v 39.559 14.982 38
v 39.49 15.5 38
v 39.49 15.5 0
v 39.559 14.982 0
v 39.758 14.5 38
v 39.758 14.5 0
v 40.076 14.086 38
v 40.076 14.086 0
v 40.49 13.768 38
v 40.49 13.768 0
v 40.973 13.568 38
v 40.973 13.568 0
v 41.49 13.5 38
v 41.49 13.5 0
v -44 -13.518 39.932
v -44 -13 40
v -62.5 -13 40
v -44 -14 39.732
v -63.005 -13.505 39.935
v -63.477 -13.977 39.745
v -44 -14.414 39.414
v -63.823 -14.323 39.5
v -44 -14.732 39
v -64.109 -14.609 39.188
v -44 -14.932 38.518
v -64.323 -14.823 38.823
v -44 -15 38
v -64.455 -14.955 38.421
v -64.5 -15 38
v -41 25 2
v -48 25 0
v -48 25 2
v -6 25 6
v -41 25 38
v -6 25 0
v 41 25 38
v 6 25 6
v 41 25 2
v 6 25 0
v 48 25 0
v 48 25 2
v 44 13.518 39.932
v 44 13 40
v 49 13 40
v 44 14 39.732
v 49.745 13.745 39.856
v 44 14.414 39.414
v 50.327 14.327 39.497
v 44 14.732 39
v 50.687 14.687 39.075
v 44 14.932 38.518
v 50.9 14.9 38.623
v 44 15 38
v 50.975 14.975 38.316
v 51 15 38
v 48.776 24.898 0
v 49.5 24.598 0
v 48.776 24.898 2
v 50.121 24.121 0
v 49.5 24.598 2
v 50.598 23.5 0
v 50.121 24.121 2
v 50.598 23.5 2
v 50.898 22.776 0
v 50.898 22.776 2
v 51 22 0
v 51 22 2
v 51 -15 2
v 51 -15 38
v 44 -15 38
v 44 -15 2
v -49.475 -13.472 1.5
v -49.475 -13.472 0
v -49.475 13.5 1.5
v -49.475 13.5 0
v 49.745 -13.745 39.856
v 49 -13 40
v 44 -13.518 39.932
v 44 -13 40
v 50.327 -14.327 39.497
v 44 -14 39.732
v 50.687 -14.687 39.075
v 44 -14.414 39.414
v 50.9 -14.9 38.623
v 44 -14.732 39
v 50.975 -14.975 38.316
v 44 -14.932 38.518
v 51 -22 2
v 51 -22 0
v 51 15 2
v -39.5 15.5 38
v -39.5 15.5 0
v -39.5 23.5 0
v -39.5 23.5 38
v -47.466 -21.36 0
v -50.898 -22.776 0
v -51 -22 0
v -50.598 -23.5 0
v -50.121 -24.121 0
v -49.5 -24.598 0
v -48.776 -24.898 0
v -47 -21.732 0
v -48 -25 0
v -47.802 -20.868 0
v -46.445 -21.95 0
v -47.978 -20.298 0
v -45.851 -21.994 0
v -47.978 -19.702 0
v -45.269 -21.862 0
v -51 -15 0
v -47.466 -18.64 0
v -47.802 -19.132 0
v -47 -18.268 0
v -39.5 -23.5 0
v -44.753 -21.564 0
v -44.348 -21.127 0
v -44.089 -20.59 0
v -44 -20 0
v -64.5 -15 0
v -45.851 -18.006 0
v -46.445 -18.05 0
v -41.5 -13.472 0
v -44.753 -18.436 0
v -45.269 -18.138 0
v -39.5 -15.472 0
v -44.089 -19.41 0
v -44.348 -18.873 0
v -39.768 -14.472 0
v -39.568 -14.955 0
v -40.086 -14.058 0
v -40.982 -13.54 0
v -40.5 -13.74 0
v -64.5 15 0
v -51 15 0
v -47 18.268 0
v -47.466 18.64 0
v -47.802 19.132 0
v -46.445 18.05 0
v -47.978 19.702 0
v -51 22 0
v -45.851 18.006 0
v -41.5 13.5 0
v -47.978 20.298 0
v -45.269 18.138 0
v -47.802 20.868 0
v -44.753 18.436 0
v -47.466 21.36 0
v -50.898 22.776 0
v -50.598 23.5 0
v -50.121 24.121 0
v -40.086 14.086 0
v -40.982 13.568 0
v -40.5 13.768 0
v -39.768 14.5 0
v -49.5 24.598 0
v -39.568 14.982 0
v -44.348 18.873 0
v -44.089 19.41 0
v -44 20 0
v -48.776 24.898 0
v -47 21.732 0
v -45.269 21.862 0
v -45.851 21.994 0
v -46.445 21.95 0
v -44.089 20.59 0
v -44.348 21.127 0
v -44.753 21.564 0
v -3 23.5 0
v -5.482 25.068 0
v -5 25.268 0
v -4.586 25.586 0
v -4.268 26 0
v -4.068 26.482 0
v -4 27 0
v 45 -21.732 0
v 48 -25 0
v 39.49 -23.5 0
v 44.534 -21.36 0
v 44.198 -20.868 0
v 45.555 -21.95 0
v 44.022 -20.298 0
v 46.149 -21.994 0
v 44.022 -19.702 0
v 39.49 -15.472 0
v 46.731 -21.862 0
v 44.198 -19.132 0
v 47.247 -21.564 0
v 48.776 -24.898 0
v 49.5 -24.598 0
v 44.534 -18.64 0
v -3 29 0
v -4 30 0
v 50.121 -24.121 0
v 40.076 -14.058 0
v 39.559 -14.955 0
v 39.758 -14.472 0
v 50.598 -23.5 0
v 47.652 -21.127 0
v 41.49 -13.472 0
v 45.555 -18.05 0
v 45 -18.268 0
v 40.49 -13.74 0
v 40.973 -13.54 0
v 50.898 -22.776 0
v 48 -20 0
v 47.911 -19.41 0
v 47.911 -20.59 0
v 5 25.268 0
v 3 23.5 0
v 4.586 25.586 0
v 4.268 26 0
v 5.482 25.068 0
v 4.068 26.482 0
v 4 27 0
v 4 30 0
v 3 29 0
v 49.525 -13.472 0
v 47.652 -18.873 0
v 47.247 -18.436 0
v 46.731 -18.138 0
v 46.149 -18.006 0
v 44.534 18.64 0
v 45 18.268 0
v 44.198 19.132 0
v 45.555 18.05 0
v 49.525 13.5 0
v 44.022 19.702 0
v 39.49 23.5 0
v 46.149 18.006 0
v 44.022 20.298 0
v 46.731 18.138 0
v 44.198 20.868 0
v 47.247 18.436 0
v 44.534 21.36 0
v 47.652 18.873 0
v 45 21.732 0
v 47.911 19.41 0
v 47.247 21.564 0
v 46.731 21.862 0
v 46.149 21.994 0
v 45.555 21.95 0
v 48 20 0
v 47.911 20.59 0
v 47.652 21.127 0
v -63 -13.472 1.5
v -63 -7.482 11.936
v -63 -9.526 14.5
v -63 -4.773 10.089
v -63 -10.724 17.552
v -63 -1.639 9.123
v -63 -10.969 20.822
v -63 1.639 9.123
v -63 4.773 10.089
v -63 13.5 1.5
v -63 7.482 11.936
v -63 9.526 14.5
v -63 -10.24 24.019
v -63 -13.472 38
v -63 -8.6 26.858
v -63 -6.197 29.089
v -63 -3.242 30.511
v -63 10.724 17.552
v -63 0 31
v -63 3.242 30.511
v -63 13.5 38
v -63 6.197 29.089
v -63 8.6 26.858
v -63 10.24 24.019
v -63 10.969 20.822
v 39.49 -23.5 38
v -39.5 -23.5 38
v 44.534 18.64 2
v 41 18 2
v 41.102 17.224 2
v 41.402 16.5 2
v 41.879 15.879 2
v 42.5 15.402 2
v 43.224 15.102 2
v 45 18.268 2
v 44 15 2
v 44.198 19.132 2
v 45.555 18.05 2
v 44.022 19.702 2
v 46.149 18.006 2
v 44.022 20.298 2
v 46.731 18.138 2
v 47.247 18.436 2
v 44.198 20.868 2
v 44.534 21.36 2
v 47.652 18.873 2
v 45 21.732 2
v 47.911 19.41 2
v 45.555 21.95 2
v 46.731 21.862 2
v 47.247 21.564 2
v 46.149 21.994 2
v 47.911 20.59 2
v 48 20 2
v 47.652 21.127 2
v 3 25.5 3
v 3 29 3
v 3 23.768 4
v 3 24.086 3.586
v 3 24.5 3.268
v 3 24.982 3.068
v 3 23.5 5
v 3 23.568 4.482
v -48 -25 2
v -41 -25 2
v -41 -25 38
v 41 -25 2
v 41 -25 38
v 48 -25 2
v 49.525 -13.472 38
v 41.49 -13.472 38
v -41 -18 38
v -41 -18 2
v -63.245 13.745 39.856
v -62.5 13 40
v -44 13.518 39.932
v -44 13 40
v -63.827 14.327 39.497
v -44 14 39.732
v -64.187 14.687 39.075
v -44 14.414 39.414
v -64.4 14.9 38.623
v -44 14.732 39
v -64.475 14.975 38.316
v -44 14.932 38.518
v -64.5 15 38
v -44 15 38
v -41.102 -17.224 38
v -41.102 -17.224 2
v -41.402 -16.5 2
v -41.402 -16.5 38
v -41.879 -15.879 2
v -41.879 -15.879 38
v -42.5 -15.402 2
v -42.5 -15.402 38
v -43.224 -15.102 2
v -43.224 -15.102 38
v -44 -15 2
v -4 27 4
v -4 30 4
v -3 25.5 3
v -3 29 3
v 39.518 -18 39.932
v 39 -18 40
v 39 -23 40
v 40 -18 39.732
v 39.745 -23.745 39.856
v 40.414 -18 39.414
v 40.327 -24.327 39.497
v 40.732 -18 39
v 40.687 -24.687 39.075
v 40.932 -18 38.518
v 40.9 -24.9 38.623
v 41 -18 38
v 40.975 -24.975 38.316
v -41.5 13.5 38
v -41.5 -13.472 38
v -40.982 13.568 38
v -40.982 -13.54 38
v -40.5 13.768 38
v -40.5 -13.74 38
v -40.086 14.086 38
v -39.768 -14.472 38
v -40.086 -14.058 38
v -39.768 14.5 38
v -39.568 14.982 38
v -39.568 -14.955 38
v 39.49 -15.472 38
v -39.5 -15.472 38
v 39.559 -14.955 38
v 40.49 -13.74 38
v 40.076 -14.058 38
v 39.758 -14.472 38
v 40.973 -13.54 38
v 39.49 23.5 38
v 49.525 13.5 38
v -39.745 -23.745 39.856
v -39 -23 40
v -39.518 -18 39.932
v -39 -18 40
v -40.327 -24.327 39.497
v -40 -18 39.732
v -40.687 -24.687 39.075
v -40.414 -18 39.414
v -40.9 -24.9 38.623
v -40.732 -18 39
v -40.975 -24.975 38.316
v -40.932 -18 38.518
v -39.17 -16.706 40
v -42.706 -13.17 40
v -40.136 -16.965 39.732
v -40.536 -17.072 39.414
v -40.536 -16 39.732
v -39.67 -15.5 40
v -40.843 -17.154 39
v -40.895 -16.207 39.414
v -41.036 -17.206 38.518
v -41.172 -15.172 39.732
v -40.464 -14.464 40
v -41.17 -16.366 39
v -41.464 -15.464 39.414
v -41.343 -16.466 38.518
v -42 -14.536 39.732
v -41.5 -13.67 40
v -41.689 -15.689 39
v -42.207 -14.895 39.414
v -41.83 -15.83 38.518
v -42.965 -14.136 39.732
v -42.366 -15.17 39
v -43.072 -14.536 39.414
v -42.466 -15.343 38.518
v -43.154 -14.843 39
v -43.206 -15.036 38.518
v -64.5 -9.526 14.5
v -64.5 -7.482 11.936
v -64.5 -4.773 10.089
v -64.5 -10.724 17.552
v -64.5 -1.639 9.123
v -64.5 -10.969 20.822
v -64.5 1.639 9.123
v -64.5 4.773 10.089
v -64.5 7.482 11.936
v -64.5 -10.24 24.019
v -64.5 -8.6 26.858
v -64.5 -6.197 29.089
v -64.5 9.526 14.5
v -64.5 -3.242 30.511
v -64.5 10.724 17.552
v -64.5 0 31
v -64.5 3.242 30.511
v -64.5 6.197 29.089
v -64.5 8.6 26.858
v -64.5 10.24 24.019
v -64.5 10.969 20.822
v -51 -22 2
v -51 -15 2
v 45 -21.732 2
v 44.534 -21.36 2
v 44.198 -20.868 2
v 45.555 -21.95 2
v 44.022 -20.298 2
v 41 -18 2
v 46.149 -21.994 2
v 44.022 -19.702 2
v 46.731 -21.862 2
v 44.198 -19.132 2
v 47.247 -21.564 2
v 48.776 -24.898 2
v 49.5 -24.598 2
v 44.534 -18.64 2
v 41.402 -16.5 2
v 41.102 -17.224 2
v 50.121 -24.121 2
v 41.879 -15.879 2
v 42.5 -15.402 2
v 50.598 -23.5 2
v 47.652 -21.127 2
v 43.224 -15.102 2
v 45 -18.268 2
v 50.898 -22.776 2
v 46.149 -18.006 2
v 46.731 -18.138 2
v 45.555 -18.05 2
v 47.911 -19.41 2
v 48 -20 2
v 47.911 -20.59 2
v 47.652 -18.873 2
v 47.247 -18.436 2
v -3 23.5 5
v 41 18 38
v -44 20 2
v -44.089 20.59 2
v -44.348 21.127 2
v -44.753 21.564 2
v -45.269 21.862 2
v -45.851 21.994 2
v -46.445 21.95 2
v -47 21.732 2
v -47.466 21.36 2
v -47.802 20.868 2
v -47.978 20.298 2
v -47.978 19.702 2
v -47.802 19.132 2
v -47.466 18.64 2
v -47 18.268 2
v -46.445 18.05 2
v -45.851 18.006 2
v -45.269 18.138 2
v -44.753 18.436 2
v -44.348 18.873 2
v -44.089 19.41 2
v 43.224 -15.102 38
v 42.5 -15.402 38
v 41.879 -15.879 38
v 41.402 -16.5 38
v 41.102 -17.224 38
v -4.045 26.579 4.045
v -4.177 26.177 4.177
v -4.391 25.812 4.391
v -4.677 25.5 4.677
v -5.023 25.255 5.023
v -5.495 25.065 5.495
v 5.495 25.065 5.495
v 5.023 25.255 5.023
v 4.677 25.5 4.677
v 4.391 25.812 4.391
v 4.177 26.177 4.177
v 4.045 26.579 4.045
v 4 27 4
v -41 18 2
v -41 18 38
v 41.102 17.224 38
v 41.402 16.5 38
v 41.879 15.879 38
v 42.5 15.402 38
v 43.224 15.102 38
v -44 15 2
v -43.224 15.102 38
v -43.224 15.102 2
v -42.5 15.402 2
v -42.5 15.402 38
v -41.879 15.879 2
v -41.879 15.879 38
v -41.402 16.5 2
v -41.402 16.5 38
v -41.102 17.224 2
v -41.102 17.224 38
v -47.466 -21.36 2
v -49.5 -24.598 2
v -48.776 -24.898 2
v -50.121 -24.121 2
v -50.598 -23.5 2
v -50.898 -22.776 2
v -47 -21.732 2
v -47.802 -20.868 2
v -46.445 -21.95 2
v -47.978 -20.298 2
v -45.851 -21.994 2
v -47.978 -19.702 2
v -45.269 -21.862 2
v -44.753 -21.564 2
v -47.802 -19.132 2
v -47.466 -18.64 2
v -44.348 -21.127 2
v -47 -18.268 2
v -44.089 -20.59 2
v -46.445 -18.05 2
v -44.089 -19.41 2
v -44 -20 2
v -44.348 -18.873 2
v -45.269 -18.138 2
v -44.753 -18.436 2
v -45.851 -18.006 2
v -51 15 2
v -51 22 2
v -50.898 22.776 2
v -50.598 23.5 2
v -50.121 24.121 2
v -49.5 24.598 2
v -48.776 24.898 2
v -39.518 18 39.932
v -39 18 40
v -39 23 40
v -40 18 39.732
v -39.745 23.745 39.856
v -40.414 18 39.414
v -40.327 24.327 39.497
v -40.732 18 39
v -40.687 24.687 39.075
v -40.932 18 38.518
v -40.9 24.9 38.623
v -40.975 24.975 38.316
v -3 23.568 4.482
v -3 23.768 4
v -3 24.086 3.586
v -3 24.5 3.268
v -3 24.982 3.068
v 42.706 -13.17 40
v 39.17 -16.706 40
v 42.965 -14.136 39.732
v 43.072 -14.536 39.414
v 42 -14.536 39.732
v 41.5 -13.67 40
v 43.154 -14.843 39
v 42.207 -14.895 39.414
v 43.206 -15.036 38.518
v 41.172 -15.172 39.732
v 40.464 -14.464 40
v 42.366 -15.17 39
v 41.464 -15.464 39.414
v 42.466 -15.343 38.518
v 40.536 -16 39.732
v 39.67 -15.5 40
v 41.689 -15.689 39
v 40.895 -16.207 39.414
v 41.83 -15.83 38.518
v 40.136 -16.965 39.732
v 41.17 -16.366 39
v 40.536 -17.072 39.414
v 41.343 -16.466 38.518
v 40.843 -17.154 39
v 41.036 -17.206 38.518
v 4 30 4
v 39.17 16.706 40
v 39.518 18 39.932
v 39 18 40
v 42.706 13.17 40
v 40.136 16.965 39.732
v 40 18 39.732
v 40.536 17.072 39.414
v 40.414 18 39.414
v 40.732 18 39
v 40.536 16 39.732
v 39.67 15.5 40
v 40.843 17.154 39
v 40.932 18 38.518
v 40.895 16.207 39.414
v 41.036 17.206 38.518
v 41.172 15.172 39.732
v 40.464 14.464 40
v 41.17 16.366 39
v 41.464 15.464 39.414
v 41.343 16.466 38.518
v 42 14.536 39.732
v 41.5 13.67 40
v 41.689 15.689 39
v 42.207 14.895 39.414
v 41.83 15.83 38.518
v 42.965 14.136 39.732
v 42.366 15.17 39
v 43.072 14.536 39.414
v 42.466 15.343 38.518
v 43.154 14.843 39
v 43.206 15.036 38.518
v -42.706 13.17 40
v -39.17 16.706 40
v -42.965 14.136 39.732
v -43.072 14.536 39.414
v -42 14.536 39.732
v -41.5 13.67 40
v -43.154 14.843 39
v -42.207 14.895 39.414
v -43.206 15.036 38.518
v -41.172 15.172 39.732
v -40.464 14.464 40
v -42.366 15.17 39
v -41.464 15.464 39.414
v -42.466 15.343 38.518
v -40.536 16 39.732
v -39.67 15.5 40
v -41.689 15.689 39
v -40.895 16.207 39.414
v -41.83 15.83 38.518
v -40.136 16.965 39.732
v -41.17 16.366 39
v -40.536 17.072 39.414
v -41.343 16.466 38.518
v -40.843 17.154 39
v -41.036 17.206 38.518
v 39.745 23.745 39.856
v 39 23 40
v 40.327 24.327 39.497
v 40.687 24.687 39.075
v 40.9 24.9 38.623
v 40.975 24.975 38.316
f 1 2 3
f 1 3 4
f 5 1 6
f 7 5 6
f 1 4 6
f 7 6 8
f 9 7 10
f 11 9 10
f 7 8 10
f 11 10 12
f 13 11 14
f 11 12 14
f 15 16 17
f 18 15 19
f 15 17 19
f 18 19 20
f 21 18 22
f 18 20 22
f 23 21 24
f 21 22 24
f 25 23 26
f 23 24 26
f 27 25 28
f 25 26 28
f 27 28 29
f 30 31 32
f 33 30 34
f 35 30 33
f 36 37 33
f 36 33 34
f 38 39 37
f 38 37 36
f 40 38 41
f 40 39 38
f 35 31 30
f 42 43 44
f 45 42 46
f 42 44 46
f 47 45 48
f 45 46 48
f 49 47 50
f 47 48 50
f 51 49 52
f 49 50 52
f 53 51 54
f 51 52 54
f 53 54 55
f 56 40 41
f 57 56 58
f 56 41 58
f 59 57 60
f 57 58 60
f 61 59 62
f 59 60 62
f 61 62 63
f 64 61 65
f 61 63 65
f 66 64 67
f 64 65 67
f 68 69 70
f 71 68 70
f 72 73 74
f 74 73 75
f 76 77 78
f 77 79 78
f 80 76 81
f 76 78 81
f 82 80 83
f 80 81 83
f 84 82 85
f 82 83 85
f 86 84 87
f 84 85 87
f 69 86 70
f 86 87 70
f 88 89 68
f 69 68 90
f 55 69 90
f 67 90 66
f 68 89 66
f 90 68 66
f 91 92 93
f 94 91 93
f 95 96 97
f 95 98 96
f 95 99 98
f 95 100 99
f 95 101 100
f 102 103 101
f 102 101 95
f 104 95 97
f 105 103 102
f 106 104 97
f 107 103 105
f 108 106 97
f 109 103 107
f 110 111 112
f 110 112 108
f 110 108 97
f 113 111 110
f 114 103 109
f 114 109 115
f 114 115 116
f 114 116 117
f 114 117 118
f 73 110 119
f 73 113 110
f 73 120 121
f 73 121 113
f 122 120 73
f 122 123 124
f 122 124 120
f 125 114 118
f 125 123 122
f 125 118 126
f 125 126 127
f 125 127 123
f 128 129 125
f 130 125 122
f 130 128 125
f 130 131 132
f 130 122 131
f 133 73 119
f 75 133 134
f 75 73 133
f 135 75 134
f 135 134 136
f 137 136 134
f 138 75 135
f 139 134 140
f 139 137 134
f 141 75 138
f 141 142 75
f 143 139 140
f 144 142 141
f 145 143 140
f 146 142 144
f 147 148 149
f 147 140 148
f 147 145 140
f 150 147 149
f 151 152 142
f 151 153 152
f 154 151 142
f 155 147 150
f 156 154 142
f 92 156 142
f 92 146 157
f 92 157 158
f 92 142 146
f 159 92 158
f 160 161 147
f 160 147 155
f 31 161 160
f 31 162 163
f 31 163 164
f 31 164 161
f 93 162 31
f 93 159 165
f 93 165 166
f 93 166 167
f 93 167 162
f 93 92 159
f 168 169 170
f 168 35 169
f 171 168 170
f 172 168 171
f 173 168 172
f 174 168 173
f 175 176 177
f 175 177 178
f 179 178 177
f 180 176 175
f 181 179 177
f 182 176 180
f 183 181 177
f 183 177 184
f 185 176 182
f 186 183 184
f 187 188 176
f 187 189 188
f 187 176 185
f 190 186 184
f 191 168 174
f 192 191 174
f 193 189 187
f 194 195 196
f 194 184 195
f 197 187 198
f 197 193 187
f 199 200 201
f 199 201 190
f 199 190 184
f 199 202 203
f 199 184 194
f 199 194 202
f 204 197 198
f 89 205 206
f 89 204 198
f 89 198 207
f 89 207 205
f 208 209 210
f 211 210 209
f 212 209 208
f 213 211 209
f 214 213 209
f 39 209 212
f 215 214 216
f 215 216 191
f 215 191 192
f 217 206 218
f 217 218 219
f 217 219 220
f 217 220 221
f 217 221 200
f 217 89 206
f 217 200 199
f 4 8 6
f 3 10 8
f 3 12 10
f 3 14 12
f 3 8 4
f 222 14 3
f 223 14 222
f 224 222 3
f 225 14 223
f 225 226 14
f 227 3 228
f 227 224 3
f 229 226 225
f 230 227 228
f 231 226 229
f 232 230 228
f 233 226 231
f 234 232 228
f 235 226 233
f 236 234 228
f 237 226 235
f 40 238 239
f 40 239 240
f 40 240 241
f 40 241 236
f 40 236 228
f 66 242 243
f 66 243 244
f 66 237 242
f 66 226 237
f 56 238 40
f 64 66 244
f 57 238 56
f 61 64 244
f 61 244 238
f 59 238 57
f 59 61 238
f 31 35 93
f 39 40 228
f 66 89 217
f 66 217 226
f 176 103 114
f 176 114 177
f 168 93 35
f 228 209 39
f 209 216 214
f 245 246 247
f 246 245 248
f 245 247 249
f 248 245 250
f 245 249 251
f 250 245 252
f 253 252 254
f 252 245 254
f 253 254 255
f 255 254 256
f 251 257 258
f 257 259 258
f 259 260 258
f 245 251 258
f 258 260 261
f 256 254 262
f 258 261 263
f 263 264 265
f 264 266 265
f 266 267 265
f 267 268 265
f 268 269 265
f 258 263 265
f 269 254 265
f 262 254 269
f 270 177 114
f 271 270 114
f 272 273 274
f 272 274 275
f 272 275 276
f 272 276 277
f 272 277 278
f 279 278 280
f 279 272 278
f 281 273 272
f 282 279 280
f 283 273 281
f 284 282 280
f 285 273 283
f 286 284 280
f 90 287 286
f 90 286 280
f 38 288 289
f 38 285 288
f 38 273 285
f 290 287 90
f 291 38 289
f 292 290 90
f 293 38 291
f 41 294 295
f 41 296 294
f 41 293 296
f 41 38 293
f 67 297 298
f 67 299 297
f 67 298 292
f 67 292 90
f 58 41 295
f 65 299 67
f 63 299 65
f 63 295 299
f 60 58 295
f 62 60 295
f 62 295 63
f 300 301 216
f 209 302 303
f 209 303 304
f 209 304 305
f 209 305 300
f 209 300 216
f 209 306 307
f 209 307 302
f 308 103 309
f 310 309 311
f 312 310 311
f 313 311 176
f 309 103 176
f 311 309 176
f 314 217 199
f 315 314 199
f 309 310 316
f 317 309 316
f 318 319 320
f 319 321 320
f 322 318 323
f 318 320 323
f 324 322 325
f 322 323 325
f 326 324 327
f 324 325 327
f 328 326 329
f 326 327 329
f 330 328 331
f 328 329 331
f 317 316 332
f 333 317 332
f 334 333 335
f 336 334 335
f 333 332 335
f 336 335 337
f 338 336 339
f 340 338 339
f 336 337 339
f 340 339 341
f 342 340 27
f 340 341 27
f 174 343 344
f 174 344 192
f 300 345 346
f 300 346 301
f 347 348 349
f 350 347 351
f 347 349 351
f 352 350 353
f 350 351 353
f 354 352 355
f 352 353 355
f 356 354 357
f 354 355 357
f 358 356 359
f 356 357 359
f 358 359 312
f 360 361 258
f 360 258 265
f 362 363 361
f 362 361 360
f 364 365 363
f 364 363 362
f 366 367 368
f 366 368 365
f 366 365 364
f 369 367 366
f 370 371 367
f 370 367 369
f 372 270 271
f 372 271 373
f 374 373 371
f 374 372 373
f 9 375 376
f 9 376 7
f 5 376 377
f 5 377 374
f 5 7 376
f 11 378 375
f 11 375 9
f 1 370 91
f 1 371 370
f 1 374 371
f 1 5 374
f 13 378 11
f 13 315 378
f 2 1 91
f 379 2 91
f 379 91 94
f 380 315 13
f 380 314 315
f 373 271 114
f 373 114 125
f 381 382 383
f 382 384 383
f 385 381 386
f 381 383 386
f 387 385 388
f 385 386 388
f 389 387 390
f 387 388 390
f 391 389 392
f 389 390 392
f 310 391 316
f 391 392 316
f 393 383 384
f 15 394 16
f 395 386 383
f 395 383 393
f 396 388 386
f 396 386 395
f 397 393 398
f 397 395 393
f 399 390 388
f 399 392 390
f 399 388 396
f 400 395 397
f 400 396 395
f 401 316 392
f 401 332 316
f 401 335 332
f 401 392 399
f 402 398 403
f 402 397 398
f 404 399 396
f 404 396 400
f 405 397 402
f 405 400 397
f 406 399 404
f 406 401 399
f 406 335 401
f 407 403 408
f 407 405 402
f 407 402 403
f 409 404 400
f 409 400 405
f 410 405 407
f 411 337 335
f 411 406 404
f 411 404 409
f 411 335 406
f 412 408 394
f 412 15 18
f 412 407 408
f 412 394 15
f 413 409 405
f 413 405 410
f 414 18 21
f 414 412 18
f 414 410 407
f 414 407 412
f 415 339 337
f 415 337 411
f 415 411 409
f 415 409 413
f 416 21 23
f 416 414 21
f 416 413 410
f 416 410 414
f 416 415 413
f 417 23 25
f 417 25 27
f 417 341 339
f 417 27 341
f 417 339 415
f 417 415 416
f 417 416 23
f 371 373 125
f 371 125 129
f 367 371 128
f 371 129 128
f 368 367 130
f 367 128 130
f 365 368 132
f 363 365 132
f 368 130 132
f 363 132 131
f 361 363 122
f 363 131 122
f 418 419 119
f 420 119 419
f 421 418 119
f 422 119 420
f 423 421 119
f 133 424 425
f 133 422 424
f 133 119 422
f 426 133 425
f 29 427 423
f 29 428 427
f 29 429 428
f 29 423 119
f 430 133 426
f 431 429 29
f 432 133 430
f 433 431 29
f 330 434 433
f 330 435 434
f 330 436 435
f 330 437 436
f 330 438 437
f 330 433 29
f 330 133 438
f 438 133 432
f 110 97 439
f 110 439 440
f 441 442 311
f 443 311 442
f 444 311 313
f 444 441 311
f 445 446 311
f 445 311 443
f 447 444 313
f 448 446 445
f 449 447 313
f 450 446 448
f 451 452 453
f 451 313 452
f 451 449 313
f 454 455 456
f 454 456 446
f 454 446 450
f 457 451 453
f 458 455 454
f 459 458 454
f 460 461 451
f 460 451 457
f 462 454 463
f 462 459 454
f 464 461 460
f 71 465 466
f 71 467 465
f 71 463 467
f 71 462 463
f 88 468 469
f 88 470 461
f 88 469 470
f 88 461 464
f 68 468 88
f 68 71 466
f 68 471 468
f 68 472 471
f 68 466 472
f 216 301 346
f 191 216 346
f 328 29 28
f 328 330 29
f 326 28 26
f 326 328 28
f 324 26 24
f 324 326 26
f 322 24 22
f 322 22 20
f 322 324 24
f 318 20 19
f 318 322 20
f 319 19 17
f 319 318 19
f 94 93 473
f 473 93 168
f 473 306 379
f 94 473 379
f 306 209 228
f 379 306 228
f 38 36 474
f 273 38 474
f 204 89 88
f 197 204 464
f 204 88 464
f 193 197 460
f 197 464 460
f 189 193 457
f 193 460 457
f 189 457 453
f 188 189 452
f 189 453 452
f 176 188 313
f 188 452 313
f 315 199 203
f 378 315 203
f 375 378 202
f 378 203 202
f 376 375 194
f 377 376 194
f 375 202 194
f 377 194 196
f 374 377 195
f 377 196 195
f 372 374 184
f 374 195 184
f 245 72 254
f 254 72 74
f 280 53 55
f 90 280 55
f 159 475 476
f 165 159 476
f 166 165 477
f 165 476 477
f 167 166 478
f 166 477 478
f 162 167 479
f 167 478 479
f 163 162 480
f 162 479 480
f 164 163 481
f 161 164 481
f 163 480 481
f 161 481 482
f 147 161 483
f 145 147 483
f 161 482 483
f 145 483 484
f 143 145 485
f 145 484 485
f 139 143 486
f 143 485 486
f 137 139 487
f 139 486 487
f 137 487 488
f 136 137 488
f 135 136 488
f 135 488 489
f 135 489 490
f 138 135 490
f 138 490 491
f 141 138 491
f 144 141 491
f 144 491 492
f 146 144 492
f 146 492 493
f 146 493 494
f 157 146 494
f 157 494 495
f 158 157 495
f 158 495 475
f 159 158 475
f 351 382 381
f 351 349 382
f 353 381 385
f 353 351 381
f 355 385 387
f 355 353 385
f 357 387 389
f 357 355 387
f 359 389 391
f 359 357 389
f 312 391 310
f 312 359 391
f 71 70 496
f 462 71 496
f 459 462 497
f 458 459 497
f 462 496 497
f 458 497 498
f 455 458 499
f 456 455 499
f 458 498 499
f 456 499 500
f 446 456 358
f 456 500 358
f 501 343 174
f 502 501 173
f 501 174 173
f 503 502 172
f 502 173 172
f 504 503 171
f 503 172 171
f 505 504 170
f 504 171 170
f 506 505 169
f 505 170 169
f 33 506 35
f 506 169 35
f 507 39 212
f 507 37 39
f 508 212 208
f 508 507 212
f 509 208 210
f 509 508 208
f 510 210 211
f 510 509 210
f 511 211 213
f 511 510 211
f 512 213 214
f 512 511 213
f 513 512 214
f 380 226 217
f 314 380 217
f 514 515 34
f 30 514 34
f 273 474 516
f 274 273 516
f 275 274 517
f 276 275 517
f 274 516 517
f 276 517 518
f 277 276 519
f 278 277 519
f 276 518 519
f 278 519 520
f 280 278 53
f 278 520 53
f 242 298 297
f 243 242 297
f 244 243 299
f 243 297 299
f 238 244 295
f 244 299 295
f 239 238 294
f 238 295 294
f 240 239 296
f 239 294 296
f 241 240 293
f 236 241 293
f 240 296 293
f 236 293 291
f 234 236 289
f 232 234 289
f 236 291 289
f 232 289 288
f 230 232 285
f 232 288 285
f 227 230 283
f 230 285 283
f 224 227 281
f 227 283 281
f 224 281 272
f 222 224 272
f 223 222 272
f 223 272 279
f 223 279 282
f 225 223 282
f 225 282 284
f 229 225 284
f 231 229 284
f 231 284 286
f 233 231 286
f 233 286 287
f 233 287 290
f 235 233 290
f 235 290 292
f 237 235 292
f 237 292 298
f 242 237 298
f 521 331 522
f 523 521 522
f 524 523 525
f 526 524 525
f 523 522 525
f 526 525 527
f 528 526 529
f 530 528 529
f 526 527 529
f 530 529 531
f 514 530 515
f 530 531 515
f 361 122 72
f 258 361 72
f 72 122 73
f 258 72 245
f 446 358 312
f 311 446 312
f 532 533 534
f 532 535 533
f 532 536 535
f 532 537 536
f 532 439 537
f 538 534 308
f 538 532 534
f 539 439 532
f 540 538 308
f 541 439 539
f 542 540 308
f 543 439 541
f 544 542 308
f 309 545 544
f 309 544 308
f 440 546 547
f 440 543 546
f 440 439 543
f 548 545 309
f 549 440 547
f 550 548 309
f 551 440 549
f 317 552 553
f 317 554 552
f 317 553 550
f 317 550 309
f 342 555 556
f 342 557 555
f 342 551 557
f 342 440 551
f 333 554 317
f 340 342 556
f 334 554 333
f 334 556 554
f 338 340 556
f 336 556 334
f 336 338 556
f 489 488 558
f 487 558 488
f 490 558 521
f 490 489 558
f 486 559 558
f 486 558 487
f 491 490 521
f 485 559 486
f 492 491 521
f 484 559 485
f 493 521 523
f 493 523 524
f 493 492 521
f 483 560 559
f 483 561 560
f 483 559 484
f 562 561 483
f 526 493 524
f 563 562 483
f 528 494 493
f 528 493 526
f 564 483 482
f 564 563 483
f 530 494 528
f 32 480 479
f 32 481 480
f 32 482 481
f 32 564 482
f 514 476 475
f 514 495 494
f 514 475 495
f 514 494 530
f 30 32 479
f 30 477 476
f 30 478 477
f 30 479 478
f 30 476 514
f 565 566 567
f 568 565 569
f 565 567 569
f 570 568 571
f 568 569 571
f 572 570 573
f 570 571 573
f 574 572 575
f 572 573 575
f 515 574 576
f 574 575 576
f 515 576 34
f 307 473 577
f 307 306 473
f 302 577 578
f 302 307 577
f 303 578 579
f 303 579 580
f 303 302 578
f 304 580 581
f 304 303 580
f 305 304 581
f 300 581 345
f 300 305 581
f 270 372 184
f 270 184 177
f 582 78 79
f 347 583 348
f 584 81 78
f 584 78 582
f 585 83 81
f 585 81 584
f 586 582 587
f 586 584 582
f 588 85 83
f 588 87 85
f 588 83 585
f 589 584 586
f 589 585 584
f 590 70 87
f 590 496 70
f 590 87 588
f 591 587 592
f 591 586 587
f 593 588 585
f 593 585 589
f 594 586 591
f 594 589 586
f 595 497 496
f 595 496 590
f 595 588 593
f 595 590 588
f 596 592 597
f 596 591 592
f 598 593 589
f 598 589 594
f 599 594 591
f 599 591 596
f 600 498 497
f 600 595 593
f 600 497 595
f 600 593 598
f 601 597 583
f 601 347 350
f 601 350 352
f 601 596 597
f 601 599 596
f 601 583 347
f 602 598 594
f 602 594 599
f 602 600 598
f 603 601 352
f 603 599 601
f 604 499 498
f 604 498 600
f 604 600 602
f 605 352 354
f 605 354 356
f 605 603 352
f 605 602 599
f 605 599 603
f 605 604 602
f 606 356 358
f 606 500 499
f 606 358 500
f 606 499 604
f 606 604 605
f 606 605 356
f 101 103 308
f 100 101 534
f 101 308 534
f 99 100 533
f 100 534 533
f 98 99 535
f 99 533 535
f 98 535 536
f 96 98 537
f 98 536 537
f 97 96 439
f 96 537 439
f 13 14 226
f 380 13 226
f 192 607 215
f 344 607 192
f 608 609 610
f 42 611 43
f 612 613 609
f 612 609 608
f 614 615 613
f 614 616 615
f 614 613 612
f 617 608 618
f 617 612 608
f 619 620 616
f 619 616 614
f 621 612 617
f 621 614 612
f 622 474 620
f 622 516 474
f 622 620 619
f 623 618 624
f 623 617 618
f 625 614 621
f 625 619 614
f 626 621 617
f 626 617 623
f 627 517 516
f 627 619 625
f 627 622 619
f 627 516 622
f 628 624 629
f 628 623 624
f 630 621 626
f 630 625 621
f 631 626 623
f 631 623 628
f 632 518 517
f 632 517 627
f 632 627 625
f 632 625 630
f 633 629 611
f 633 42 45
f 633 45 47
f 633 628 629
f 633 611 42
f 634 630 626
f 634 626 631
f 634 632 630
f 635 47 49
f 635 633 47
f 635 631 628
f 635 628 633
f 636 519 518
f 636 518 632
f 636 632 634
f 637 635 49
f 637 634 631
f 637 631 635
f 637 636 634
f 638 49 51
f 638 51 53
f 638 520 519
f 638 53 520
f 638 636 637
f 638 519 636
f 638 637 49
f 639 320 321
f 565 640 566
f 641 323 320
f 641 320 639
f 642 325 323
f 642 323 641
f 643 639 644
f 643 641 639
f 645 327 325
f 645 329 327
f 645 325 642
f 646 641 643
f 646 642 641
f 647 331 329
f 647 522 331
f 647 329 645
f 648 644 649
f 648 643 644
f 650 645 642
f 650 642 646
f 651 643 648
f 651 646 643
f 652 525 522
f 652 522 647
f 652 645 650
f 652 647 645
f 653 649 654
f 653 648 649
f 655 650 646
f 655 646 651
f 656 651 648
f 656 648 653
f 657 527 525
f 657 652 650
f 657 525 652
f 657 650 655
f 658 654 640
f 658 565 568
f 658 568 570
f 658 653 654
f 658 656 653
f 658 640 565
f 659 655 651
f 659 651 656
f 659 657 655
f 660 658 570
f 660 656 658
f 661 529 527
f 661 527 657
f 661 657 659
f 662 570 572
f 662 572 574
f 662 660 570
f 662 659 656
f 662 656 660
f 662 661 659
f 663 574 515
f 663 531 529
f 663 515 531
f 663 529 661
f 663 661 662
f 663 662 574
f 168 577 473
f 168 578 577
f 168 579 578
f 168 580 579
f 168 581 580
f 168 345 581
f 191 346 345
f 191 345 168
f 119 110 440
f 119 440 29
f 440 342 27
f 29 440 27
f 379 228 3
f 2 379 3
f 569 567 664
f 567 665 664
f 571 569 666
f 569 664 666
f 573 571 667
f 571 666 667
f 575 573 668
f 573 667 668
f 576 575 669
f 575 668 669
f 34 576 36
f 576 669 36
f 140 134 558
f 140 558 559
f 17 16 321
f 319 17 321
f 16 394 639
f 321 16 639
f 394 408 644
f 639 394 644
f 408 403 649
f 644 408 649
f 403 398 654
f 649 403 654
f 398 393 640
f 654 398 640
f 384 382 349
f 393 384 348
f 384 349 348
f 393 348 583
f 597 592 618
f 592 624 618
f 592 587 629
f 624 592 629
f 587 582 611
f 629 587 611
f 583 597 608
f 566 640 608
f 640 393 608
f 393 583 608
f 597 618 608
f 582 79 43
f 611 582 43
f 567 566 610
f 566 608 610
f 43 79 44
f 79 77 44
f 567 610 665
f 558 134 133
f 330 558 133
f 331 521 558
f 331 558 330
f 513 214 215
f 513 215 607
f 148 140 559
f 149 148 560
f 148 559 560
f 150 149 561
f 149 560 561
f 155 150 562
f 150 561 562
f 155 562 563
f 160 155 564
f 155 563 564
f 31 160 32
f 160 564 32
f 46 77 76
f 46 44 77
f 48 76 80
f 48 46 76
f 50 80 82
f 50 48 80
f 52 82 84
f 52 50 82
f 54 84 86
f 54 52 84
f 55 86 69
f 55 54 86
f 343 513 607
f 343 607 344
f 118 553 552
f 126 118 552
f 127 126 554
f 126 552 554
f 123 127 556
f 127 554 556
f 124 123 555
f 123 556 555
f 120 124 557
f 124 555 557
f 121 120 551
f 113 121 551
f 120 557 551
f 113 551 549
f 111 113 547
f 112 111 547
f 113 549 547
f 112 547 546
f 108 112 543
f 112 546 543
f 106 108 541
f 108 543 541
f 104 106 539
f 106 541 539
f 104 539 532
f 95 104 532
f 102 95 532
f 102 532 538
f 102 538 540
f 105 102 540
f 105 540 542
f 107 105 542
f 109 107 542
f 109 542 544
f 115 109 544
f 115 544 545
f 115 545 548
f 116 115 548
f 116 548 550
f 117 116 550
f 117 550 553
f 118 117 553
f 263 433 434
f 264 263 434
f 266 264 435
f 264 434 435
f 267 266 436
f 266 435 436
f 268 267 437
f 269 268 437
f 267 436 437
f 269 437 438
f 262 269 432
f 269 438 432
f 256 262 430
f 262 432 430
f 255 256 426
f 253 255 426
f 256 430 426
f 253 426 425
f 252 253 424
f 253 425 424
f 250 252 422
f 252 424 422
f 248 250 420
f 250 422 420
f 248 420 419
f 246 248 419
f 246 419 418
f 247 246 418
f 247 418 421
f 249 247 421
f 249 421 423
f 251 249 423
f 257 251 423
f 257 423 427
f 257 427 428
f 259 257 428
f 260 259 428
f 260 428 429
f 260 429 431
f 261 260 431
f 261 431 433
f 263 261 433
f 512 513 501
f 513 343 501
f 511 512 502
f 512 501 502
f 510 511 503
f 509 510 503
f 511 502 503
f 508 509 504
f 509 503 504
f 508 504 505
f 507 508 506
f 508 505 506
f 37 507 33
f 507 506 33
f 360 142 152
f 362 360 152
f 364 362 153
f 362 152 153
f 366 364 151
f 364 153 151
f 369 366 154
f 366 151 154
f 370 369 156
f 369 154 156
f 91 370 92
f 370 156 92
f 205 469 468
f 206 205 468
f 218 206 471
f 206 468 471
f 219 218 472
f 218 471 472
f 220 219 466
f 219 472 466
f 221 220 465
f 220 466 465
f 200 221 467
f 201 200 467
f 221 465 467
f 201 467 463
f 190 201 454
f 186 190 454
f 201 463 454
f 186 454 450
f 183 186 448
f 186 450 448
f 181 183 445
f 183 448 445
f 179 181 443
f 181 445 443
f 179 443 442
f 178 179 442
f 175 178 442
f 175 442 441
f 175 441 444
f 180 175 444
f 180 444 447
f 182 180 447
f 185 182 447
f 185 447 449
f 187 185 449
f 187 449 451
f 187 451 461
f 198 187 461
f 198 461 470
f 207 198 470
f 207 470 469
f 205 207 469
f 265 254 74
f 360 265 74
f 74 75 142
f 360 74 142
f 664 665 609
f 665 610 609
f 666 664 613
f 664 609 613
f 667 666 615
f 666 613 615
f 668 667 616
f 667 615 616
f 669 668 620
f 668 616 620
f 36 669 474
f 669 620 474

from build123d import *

# Parameters (mm, degrees)
CROQUIS1_W              = 102
CROQUIS1_H              = 50
SALIENTE_EXTRUIR1_DEPTH = 40
CORTAR_EXTRUIR1_DEPTH   = 38
CROQUIS4_R              = 2
CORTAR_EXTRUIR2_DEPTH   = 18
CORTAR_EXTRUIR3_DEPTH   = 38
CROQUIS7_W              = 6
CROQUIS7_H              = 3
CORTAR_EXTRUIR5_DEPTH   = 10
SALIENTE_EXTRUIR2_DEPTH = 5
CROQUIS9_W              = 6
CROQUIS9_H              = 1
SALIENTE_EXTRUIR3_DEPTH = 3
REDONDEO2_R             = 2
REDONDEO4_R             = 2
CROQUIS16_W             = 36.5
CROQUIS16_H             = 26.972151698
CORTAR_EXTRUIR13_DEPTH  = 5.5
CROQUIS17_W             = 40
CROQUIS17_H             = 30
CROQUIS17_W_2           = 36.5
CROQUIS17_H_2           = 26.972151698
SALIENTE_EXTRUIR7_DEPTH = 13.5
CROQUIS18_W             = 1.5
CROQUIS18_H             = 36.5
SALIENTE_EXTRUIR8_DEPTH = 27.5
CROQUIS19_R             = 11
CORTAR_EXTRUIR14_DEPTH  = 27.5
REDONDEO5_R             = 2


with BuildPart() as part:
    # Croquis1 → Saliente-Extruir1 (new body)
    with BuildSketch(Plane.XY):
        Rectangle(CROQUIS1_W, CROQUIS1_H)
    extrude(amount=SALIENTE_EXTRUIR1_DEPTH)

    # Croquis3 → Cortar-Extruir1 (cut)
    with BuildSketch(Plane.XY.offset(40)):
        with BuildLine():
            Line((51, 25), (41, 25))
            Line((41, 25), (41, 18))
            ThreePointArc((41, 18), (41.878679656, 15.878679656), (44, 15))
            Line((44, 15), (51, 15))
            Line((51, 15), (51, 25))
        make_face()
        with BuildLine():
            Line((41, -18), (41, -25))
            Line((41, -25), (51, -25))
            Line((51, -25), (51, -15))
            Line((51, -15), (44, -15))
            ThreePointArc((44, -15), (41.878679656, -15.878679656), (41, -18))
        make_face()
        with BuildLine():
            Line((-44, -15), (-51, -15))
            Line((-51, -15), (-51, -25))
            Line((-51, -25), (-41, -25))
            Line((-41, -25), (-41, -18))
            ThreePointArc((-41, -18), (-41.878679656, -15.878679656), (-44, -15))
        make_face()
        with BuildLine():
            Line((-51, 25), (-51, 15))
            Line((-51, 15), (-44, 15))
            ThreePointArc((-44, 15), (-41.878679656, 15.878679656), (-41, 18))
            Line((-41, 18), (-41, 25))
            Line((-41, 25), (-51, 25))
        make_face()
    extrude(amount=-CORTAR_EXTRUIR1_DEPTH, mode=Mode.SUBTRACT)

    # Croquis4 → Cortar-Extruir2 (cut)
    with BuildSketch(Plane.XY.offset(2)):
        with BuildLine():
            Line((-51, -25), (-48, -25))
            ThreePointArc((-48, -25), (-50.121320344, -24.121320344), (-51, -22))
            Line((-51, -22), (-51, -25))
        make_face()
        with Locations((-46, -20)):
            Circle(CROQUIS4_R)
        with BuildLine():
            Line((-51, 25), (-51, 22))
            ThreePointArc((-51, 22), (-50.121320344, 24.121320344), (-48, 25))
            Line((-48, 25), (-51, 25))
        make_face()
        with Locations((-46, 20)):
            Circle(CROQUIS4_R)
        with Locations((46, 20)):
            Circle(CROQUIS4_R)
        with BuildLine():
            ThreePointArc((48, 25), (50.121320344, 24.121320344), (51, 22))
            Line((51, 22), (51, 25))
            Line((51, 25), (48, 25))
        make_face()
        with Locations((46, -20)):
            Circle(CROQUIS4_R)
        with BuildLine():
            ThreePointArc((51, -22), (50.121320344, -24.121320344), (48, -25))
            Line((48, -25), (51, -25))
            Line((51, -25), (51, -22))
        make_face()
    extrude(amount=-CORTAR_EXTRUIR2_DEPTH, mode=Mode.SUBTRACT)

    # Croquis5 → Cortar-Extruir3 (cut)
    with BuildSketch(Plane(origin=(0, 0, 0), x_dir=(-1, 0, 0), z_dir=(0, 0, -1))):
        with BuildLine():
            Line((0, 23.5), (-39.490487895, 23.5))
            Line((-39.490487895, 23.5), (-39.490487895, 15.5))
            ThreePointArc((-39.490487895, 15.5), (-40.076274332, 14.085786438), (-41.490487895, 13.5))
            Line((-41.490487895, 13.5), (-49.525351845, 13.5))
            Line((-49.525351845, 13.5), (-49.525351845, -13.472151698))
            Line((-49.525351845, -13.472151698), (-41.490487895, -13.472151698))
            ThreePointArc((-41.490487895, -13.472151698), (-40.076274332, -14.057938136), (-39.490487895, -15.472151698))
            Line((-39.490487895, -15.472151698), (-39.490487895, -23.5))
            Line((-39.490487895, -23.5), (39.5, -23.5))
            Line((39.5, -23.5), (39.5, -15.472151698))
            ThreePointArc((39.5, -15.472151698), (40.085786438, -14.057938136), (41.5, -13.472151698))
            Line((41.5, -13.472151698), (49.474648155, -13.472151698))
            Line((49.474648155, -13.472151698), (49.474648155, 13.5))
            Line((49.474648155, 13.5), (41.5, 13.5))
            ThreePointArc((41.5, 13.5), (40.085786438, 14.085786438), (39.5, 15.5))
            Line((39.5, 15.5), (39.5, 23.5))
            Line((39.5, 23.5), (0, 23.5))
        make_face()
    extrude(amount=-CORTAR_EXTRUIR3_DEPTH, mode=Mode.SUBTRACT)

    # Croquis7 → Cortar-Extruir5 (cut)
    with BuildSketch(Plane(origin=(0, 25, 0), x_dir=(1, 0, 0), z_dir=(0, 1, 0))):
        with Locations((0, -1.5)):
            Rectangle(CROQUIS7_W, CROQUIS7_H)
    extrude(amount=-CORTAR_EXTRUIR5_DEPTH, mode=Mode.SUBTRACT)

    # Croquis8 → Saliente-Extruir2 (add)
    with BuildSketch(Plane(origin=(0, 25, 0), x_dir=(1, 0, 0), z_dir=(0, 1, 0))):
        Polygon((3, 0), (4, 0), (4, -4), (-4, -4), (-4, 0), (-3, 0), (-3, -3), (3, -3), align=None)
    extrude(amount=SALIENTE_EXTRUIR2_DEPTH)

    # Croquis9 → Saliente-Extruir3 (add)
    with BuildSketch(Plane(origin=(0, 0, 3), x_dir=(-1, 0, 0), z_dir=(0, 0, -1))):
        with Locations((0, 29.5)):
            Rectangle(CROQUIS9_W, CROQUIS9_H)
    extrude(amount=SALIENTE_EXTRUIR3_DEPTH)

    # Redondeo2
    redondeo2_edges = [part.edges().sort_by_distance(p)[0] for p in [
        (0, 23.5, 3),
    ]]
    fillet(redondeo2_edges, radius=REDONDEO2_R)

    # Redondeo4
    redondeo4_edges = [part.edges().sort_by_distance(p)[0] for p in [
        (-4, 25, 2),
        (0, 25, 4),
        (4, 25, 2),
    ]]
    fillet(redondeo4_edges, radius=REDONDEO4_R)

    # Croquis16 → Cortar-Extruir13 (cut)
    with BuildSketch(Plane(origin=(-49.474648155, 0, 0), x_dir=(0, 0, -1), z_dir=(1, 0, 0))):
        with Locations((-19.75, 0.013924151)):
            Rectangle(CROQUIS16_W, CROQUIS16_H)
    extrude(amount=-CORTAR_EXTRUIR13_DEPTH, mode=Mode.SUBTRACT)

    # Croquis17 → Saliente-Extruir7 (add)
    with BuildSketch(Plane.ZY.offset(51)):
        with Locations((20, 0)):
            Rectangle(CROQUIS17_W, CROQUIS17_H)
        with Locations((19.75, 0.013924151)):
            Rectangle(CROQUIS17_W_2, CROQUIS17_H_2, mode=Mode.SUBTRACT)
    extrude(amount=SALIENTE_EXTRUIR7_DEPTH)

    # Croquis18 → Saliente-Extruir8 (add)
    with BuildSketch(Plane.XZ.offset(-13.5)):
        with Locations((-63.75, 19.75)):
            Rectangle(CROQUIS18_W, CROQUIS18_H)
    extrude(amount=SALIENTE_EXTRUIR8_DEPTH)

    # Croquis19 → Cortar-Extruir14 (cut)
    with BuildSketch(Plane.ZY.offset(64.5)):
        with Locations((20, 0)):
            Circle(CROQUIS19_R)
    extrude(amount=-CORTAR_EXTRUIR14_DEPTH, mode=Mode.SUBTRACT)

    # Redondeo5
    redondeo5_edges = [part.edges().sort_by_distance(p)[0] for p in [
        (51, 0, 40),
        (0, 25, 40),
        (0, -25, 40),
        (-41.878679656, 15.878679656, 40),
        (-41, 21.5, 40),
        (-64.5, 0, 40),
        (-54.25, 15, 40),
        (-41.878679656, -15.878679656, 40),
        (-41, -21.5, 40),
        (-54.25, -15, 40),
        (41.878679656, -15.878679656, 40),
        (47.5, -15, 40),
        (41, -21.5, 40),
        (41.878679656, 15.878679656, 40),
        (47.5, 15, 40),
        (41, 21.5, 40),
    ]]
    fillet(redondeo5_edges, radius=REDONDEO5_R)


solid = part.part
